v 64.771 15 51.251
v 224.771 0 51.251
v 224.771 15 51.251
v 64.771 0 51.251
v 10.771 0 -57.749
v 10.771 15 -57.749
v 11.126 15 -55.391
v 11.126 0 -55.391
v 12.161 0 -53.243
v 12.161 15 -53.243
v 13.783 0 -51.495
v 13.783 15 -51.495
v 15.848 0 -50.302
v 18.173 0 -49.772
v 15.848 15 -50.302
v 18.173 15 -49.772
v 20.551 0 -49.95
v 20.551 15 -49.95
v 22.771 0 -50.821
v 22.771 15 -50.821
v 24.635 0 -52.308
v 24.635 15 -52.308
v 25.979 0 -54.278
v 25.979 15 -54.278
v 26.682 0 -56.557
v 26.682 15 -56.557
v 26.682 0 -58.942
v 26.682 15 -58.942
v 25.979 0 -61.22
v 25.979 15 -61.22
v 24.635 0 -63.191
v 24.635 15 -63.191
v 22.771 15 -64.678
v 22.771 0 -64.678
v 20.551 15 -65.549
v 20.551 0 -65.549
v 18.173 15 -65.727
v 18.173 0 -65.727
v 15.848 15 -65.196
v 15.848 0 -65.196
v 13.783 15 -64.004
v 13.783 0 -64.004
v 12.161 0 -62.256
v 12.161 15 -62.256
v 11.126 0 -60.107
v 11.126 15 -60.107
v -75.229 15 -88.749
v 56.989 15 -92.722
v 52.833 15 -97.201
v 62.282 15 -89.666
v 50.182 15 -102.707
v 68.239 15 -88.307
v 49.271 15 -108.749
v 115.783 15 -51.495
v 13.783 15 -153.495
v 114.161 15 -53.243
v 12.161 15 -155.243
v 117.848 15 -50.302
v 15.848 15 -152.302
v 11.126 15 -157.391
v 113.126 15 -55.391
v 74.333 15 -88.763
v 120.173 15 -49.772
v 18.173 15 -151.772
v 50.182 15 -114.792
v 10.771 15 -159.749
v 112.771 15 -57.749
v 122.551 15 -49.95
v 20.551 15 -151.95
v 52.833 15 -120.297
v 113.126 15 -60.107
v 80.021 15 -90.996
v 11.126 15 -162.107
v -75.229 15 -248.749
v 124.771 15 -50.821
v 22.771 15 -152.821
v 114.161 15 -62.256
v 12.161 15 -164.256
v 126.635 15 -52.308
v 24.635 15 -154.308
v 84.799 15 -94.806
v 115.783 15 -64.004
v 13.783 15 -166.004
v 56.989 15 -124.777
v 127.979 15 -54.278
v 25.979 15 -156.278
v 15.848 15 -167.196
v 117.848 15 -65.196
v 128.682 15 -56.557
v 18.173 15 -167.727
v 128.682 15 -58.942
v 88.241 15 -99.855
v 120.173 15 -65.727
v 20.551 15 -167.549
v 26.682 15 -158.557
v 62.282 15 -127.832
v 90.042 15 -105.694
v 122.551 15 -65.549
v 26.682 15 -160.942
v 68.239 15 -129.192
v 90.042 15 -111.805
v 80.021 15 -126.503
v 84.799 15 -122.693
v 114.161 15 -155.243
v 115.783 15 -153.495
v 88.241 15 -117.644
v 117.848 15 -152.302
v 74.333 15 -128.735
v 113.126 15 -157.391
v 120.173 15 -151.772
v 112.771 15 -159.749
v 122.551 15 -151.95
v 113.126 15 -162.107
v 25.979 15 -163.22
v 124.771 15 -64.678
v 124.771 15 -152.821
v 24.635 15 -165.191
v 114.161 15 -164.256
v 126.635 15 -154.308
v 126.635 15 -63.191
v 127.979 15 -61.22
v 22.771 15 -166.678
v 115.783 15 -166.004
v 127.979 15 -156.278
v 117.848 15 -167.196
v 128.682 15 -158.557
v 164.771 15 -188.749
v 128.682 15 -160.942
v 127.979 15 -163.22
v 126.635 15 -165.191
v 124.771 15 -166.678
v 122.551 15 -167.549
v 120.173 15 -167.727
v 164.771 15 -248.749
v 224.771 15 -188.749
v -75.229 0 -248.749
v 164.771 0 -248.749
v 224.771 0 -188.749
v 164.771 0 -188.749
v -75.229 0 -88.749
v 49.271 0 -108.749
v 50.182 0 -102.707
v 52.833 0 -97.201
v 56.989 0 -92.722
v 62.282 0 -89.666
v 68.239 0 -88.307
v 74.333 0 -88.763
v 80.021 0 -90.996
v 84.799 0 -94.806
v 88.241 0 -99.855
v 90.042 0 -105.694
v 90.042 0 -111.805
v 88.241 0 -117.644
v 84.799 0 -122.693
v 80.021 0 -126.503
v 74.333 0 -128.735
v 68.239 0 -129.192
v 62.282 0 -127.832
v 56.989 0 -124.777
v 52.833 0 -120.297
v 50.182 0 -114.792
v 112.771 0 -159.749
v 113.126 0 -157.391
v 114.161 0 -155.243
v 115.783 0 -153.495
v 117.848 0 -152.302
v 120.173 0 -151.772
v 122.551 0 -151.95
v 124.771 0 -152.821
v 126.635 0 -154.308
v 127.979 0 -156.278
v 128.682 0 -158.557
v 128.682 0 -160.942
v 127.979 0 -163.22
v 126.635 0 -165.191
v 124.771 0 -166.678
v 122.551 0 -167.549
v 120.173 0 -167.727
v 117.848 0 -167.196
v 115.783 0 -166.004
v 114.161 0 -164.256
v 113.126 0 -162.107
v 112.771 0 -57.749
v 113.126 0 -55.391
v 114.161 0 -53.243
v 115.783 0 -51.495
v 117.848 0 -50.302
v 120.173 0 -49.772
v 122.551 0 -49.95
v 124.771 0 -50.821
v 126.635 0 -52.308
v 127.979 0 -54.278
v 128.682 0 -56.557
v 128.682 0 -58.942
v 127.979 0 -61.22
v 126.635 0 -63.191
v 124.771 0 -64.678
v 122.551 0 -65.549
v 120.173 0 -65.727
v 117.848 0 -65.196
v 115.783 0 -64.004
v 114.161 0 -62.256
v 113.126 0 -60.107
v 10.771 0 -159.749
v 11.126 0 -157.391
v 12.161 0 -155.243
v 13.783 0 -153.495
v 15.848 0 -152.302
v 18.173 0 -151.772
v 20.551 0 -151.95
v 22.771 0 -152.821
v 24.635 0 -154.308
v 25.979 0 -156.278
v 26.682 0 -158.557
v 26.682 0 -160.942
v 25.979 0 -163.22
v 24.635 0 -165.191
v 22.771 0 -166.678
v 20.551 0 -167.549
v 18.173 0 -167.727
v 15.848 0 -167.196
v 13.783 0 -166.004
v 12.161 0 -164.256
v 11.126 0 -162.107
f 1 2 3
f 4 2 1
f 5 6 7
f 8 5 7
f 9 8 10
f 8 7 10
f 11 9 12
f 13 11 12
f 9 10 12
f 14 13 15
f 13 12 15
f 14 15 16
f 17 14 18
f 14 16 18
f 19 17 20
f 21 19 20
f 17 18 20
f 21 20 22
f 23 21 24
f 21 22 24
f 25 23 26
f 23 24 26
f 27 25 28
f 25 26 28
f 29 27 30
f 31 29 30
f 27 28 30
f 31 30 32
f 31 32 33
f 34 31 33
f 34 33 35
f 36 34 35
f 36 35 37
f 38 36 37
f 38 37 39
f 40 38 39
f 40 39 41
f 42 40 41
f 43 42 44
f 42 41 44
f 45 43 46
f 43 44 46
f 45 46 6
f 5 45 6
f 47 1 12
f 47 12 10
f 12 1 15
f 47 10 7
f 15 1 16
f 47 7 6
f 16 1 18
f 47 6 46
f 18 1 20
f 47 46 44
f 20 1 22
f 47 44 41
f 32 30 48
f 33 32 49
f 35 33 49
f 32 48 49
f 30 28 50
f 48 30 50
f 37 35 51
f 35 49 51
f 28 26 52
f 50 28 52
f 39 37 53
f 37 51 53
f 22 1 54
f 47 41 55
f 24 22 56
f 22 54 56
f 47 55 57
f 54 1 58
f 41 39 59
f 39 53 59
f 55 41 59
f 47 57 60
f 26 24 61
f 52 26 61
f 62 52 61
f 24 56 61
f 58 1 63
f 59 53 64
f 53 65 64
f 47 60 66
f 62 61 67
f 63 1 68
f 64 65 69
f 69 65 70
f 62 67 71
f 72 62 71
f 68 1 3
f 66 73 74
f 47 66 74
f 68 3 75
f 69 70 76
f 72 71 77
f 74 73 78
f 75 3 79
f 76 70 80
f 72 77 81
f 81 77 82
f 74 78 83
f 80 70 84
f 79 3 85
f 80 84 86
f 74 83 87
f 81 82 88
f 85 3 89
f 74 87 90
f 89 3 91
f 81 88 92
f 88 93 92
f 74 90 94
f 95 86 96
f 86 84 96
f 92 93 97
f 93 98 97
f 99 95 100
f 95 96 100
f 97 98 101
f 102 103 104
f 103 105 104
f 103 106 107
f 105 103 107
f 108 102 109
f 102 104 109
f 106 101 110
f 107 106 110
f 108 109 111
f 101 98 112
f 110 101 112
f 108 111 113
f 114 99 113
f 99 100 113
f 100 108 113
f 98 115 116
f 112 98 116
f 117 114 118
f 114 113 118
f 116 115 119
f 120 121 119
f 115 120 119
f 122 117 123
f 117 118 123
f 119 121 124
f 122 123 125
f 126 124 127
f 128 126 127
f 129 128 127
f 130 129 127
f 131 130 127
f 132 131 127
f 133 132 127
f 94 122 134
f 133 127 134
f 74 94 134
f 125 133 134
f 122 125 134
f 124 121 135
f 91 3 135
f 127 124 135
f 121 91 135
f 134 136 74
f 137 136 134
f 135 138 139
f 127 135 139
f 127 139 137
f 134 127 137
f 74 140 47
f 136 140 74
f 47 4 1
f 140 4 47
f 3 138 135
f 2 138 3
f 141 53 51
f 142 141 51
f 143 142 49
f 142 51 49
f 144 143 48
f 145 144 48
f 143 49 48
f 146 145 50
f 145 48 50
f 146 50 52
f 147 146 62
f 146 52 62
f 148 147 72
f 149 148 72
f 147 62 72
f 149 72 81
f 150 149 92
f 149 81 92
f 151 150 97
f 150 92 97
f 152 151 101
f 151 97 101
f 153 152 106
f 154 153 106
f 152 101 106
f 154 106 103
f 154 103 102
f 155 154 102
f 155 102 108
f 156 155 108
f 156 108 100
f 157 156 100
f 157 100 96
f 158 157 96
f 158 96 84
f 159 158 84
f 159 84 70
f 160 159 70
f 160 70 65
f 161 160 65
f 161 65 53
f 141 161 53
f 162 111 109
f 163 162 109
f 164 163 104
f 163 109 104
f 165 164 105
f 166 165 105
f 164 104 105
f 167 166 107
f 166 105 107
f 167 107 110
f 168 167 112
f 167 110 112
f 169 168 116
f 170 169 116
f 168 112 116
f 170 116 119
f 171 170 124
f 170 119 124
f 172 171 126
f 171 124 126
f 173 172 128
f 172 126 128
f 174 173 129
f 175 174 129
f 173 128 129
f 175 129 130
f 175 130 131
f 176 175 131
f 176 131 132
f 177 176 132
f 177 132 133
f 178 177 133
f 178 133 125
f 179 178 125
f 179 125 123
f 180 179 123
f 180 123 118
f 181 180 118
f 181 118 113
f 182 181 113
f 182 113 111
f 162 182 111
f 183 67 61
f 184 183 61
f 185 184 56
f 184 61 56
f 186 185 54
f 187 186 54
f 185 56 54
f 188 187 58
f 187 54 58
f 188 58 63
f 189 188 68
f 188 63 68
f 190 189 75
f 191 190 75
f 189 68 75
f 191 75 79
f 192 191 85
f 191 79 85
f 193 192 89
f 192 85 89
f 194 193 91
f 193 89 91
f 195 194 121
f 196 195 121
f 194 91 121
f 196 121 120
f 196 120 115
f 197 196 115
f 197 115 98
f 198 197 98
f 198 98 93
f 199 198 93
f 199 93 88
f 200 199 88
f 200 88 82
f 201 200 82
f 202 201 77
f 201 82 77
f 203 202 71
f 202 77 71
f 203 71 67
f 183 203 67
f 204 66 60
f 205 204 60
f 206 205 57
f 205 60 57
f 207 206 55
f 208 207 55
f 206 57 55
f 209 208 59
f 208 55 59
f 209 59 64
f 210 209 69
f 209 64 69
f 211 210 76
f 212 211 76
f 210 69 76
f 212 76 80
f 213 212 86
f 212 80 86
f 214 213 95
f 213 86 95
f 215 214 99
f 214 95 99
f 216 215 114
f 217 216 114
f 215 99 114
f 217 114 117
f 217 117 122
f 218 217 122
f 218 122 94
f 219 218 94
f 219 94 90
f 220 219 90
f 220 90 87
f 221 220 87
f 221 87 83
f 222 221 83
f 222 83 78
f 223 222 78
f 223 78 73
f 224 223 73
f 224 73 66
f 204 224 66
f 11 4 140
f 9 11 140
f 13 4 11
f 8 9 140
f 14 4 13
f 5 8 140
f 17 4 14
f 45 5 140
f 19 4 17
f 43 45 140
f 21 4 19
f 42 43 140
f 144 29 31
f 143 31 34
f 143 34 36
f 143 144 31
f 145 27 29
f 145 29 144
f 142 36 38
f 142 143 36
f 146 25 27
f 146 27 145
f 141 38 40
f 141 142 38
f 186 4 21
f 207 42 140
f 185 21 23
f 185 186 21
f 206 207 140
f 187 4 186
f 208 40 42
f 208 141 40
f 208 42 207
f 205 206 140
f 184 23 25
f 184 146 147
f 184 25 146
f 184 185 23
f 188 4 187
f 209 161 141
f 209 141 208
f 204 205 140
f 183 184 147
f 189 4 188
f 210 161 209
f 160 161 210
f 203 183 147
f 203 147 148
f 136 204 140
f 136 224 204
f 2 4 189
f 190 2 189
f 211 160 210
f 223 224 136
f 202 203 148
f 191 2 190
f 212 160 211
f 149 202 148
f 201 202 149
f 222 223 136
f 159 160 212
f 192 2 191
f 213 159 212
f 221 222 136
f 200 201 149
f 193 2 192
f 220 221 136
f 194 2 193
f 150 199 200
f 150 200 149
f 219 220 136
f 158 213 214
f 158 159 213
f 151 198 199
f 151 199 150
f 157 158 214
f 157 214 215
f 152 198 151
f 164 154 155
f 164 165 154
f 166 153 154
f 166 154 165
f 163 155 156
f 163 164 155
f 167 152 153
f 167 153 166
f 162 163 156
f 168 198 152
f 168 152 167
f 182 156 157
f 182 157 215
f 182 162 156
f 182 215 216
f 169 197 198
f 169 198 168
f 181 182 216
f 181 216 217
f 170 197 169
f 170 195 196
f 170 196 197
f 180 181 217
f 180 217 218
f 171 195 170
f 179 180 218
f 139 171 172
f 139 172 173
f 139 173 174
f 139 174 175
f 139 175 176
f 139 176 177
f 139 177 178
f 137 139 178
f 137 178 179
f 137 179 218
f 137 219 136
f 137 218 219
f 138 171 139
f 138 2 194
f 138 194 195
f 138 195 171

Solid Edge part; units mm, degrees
sketch "Sketch1" plane through (0, 0, 0) normal (0, -1, 0) x (1, 0, 0)
  line L0 (-75.229, -248.7494) -> (224.771, -248.7494)
  line L1 (224.771, -248.7494) -> (224.771, 51.2506)
  line L2 (224.771, 51.2506) -> (-75.229, 51.2506)
  line L3 (-75.229, 51.2506) -> (-75.229, -248.7494)
  dimension "D1" = 300
  dimension "D2" = 300
extrude "Protrusion1" add sketch "Sketch1" against normal blind 15
sketch "Sketch2" plane through (-15.229, 15, 1.2506) normal (0, 1, 0) x (-1, 0, 0)
  circle A0 centre (-34, -161) radius 8
  circle A1 centre (-34, -59) radius 8
  circle A2 centre (-136, -161) radius 8
  circle A3 centre (-85, -110) radius 20.5
  circle A4 centre (-136, -59) radius 8
  dimension "D1" = 16
  dimension "D2" = 16
  dimension "D3" = 16
  dimension "D4" = 16
  dimension "D5" = 102
  dimension "D6" = 102
  dimension "D7" = 41
  dimension "D8" = 51
  dimension "D9" = 51
  dimension "D10" = 5
  dimension "D11" = 10
extrude "Cutout1" cut sketch "Sketch2" against normal through all
sketch "Sketch3" plane through (49.771, 0, -73.7494) normal (0, -1, 0) x (-1, 0, 0)
  line L0 (-15, -125) -> (125, 15)
  line L1 (125, 15) -> (125, -125)
  line L2 (125, -125) -> (-15, -125)
  line L3 (-175, 115) -> (-115, 115)
  line L4 (-115, 115) -> (-115, 175)
  line L5 (-115, 175) -> (-175, 175)
  line L6 (-175, 175) -> (-175, 115)
  dimension "D1" = 60
  dimension "D2" = 60
  dimension "D3" = 140
extrude "Cutout2" cut sketch "Sketch3" against normal through all
properties material "Aluminum, 6061-T6"
